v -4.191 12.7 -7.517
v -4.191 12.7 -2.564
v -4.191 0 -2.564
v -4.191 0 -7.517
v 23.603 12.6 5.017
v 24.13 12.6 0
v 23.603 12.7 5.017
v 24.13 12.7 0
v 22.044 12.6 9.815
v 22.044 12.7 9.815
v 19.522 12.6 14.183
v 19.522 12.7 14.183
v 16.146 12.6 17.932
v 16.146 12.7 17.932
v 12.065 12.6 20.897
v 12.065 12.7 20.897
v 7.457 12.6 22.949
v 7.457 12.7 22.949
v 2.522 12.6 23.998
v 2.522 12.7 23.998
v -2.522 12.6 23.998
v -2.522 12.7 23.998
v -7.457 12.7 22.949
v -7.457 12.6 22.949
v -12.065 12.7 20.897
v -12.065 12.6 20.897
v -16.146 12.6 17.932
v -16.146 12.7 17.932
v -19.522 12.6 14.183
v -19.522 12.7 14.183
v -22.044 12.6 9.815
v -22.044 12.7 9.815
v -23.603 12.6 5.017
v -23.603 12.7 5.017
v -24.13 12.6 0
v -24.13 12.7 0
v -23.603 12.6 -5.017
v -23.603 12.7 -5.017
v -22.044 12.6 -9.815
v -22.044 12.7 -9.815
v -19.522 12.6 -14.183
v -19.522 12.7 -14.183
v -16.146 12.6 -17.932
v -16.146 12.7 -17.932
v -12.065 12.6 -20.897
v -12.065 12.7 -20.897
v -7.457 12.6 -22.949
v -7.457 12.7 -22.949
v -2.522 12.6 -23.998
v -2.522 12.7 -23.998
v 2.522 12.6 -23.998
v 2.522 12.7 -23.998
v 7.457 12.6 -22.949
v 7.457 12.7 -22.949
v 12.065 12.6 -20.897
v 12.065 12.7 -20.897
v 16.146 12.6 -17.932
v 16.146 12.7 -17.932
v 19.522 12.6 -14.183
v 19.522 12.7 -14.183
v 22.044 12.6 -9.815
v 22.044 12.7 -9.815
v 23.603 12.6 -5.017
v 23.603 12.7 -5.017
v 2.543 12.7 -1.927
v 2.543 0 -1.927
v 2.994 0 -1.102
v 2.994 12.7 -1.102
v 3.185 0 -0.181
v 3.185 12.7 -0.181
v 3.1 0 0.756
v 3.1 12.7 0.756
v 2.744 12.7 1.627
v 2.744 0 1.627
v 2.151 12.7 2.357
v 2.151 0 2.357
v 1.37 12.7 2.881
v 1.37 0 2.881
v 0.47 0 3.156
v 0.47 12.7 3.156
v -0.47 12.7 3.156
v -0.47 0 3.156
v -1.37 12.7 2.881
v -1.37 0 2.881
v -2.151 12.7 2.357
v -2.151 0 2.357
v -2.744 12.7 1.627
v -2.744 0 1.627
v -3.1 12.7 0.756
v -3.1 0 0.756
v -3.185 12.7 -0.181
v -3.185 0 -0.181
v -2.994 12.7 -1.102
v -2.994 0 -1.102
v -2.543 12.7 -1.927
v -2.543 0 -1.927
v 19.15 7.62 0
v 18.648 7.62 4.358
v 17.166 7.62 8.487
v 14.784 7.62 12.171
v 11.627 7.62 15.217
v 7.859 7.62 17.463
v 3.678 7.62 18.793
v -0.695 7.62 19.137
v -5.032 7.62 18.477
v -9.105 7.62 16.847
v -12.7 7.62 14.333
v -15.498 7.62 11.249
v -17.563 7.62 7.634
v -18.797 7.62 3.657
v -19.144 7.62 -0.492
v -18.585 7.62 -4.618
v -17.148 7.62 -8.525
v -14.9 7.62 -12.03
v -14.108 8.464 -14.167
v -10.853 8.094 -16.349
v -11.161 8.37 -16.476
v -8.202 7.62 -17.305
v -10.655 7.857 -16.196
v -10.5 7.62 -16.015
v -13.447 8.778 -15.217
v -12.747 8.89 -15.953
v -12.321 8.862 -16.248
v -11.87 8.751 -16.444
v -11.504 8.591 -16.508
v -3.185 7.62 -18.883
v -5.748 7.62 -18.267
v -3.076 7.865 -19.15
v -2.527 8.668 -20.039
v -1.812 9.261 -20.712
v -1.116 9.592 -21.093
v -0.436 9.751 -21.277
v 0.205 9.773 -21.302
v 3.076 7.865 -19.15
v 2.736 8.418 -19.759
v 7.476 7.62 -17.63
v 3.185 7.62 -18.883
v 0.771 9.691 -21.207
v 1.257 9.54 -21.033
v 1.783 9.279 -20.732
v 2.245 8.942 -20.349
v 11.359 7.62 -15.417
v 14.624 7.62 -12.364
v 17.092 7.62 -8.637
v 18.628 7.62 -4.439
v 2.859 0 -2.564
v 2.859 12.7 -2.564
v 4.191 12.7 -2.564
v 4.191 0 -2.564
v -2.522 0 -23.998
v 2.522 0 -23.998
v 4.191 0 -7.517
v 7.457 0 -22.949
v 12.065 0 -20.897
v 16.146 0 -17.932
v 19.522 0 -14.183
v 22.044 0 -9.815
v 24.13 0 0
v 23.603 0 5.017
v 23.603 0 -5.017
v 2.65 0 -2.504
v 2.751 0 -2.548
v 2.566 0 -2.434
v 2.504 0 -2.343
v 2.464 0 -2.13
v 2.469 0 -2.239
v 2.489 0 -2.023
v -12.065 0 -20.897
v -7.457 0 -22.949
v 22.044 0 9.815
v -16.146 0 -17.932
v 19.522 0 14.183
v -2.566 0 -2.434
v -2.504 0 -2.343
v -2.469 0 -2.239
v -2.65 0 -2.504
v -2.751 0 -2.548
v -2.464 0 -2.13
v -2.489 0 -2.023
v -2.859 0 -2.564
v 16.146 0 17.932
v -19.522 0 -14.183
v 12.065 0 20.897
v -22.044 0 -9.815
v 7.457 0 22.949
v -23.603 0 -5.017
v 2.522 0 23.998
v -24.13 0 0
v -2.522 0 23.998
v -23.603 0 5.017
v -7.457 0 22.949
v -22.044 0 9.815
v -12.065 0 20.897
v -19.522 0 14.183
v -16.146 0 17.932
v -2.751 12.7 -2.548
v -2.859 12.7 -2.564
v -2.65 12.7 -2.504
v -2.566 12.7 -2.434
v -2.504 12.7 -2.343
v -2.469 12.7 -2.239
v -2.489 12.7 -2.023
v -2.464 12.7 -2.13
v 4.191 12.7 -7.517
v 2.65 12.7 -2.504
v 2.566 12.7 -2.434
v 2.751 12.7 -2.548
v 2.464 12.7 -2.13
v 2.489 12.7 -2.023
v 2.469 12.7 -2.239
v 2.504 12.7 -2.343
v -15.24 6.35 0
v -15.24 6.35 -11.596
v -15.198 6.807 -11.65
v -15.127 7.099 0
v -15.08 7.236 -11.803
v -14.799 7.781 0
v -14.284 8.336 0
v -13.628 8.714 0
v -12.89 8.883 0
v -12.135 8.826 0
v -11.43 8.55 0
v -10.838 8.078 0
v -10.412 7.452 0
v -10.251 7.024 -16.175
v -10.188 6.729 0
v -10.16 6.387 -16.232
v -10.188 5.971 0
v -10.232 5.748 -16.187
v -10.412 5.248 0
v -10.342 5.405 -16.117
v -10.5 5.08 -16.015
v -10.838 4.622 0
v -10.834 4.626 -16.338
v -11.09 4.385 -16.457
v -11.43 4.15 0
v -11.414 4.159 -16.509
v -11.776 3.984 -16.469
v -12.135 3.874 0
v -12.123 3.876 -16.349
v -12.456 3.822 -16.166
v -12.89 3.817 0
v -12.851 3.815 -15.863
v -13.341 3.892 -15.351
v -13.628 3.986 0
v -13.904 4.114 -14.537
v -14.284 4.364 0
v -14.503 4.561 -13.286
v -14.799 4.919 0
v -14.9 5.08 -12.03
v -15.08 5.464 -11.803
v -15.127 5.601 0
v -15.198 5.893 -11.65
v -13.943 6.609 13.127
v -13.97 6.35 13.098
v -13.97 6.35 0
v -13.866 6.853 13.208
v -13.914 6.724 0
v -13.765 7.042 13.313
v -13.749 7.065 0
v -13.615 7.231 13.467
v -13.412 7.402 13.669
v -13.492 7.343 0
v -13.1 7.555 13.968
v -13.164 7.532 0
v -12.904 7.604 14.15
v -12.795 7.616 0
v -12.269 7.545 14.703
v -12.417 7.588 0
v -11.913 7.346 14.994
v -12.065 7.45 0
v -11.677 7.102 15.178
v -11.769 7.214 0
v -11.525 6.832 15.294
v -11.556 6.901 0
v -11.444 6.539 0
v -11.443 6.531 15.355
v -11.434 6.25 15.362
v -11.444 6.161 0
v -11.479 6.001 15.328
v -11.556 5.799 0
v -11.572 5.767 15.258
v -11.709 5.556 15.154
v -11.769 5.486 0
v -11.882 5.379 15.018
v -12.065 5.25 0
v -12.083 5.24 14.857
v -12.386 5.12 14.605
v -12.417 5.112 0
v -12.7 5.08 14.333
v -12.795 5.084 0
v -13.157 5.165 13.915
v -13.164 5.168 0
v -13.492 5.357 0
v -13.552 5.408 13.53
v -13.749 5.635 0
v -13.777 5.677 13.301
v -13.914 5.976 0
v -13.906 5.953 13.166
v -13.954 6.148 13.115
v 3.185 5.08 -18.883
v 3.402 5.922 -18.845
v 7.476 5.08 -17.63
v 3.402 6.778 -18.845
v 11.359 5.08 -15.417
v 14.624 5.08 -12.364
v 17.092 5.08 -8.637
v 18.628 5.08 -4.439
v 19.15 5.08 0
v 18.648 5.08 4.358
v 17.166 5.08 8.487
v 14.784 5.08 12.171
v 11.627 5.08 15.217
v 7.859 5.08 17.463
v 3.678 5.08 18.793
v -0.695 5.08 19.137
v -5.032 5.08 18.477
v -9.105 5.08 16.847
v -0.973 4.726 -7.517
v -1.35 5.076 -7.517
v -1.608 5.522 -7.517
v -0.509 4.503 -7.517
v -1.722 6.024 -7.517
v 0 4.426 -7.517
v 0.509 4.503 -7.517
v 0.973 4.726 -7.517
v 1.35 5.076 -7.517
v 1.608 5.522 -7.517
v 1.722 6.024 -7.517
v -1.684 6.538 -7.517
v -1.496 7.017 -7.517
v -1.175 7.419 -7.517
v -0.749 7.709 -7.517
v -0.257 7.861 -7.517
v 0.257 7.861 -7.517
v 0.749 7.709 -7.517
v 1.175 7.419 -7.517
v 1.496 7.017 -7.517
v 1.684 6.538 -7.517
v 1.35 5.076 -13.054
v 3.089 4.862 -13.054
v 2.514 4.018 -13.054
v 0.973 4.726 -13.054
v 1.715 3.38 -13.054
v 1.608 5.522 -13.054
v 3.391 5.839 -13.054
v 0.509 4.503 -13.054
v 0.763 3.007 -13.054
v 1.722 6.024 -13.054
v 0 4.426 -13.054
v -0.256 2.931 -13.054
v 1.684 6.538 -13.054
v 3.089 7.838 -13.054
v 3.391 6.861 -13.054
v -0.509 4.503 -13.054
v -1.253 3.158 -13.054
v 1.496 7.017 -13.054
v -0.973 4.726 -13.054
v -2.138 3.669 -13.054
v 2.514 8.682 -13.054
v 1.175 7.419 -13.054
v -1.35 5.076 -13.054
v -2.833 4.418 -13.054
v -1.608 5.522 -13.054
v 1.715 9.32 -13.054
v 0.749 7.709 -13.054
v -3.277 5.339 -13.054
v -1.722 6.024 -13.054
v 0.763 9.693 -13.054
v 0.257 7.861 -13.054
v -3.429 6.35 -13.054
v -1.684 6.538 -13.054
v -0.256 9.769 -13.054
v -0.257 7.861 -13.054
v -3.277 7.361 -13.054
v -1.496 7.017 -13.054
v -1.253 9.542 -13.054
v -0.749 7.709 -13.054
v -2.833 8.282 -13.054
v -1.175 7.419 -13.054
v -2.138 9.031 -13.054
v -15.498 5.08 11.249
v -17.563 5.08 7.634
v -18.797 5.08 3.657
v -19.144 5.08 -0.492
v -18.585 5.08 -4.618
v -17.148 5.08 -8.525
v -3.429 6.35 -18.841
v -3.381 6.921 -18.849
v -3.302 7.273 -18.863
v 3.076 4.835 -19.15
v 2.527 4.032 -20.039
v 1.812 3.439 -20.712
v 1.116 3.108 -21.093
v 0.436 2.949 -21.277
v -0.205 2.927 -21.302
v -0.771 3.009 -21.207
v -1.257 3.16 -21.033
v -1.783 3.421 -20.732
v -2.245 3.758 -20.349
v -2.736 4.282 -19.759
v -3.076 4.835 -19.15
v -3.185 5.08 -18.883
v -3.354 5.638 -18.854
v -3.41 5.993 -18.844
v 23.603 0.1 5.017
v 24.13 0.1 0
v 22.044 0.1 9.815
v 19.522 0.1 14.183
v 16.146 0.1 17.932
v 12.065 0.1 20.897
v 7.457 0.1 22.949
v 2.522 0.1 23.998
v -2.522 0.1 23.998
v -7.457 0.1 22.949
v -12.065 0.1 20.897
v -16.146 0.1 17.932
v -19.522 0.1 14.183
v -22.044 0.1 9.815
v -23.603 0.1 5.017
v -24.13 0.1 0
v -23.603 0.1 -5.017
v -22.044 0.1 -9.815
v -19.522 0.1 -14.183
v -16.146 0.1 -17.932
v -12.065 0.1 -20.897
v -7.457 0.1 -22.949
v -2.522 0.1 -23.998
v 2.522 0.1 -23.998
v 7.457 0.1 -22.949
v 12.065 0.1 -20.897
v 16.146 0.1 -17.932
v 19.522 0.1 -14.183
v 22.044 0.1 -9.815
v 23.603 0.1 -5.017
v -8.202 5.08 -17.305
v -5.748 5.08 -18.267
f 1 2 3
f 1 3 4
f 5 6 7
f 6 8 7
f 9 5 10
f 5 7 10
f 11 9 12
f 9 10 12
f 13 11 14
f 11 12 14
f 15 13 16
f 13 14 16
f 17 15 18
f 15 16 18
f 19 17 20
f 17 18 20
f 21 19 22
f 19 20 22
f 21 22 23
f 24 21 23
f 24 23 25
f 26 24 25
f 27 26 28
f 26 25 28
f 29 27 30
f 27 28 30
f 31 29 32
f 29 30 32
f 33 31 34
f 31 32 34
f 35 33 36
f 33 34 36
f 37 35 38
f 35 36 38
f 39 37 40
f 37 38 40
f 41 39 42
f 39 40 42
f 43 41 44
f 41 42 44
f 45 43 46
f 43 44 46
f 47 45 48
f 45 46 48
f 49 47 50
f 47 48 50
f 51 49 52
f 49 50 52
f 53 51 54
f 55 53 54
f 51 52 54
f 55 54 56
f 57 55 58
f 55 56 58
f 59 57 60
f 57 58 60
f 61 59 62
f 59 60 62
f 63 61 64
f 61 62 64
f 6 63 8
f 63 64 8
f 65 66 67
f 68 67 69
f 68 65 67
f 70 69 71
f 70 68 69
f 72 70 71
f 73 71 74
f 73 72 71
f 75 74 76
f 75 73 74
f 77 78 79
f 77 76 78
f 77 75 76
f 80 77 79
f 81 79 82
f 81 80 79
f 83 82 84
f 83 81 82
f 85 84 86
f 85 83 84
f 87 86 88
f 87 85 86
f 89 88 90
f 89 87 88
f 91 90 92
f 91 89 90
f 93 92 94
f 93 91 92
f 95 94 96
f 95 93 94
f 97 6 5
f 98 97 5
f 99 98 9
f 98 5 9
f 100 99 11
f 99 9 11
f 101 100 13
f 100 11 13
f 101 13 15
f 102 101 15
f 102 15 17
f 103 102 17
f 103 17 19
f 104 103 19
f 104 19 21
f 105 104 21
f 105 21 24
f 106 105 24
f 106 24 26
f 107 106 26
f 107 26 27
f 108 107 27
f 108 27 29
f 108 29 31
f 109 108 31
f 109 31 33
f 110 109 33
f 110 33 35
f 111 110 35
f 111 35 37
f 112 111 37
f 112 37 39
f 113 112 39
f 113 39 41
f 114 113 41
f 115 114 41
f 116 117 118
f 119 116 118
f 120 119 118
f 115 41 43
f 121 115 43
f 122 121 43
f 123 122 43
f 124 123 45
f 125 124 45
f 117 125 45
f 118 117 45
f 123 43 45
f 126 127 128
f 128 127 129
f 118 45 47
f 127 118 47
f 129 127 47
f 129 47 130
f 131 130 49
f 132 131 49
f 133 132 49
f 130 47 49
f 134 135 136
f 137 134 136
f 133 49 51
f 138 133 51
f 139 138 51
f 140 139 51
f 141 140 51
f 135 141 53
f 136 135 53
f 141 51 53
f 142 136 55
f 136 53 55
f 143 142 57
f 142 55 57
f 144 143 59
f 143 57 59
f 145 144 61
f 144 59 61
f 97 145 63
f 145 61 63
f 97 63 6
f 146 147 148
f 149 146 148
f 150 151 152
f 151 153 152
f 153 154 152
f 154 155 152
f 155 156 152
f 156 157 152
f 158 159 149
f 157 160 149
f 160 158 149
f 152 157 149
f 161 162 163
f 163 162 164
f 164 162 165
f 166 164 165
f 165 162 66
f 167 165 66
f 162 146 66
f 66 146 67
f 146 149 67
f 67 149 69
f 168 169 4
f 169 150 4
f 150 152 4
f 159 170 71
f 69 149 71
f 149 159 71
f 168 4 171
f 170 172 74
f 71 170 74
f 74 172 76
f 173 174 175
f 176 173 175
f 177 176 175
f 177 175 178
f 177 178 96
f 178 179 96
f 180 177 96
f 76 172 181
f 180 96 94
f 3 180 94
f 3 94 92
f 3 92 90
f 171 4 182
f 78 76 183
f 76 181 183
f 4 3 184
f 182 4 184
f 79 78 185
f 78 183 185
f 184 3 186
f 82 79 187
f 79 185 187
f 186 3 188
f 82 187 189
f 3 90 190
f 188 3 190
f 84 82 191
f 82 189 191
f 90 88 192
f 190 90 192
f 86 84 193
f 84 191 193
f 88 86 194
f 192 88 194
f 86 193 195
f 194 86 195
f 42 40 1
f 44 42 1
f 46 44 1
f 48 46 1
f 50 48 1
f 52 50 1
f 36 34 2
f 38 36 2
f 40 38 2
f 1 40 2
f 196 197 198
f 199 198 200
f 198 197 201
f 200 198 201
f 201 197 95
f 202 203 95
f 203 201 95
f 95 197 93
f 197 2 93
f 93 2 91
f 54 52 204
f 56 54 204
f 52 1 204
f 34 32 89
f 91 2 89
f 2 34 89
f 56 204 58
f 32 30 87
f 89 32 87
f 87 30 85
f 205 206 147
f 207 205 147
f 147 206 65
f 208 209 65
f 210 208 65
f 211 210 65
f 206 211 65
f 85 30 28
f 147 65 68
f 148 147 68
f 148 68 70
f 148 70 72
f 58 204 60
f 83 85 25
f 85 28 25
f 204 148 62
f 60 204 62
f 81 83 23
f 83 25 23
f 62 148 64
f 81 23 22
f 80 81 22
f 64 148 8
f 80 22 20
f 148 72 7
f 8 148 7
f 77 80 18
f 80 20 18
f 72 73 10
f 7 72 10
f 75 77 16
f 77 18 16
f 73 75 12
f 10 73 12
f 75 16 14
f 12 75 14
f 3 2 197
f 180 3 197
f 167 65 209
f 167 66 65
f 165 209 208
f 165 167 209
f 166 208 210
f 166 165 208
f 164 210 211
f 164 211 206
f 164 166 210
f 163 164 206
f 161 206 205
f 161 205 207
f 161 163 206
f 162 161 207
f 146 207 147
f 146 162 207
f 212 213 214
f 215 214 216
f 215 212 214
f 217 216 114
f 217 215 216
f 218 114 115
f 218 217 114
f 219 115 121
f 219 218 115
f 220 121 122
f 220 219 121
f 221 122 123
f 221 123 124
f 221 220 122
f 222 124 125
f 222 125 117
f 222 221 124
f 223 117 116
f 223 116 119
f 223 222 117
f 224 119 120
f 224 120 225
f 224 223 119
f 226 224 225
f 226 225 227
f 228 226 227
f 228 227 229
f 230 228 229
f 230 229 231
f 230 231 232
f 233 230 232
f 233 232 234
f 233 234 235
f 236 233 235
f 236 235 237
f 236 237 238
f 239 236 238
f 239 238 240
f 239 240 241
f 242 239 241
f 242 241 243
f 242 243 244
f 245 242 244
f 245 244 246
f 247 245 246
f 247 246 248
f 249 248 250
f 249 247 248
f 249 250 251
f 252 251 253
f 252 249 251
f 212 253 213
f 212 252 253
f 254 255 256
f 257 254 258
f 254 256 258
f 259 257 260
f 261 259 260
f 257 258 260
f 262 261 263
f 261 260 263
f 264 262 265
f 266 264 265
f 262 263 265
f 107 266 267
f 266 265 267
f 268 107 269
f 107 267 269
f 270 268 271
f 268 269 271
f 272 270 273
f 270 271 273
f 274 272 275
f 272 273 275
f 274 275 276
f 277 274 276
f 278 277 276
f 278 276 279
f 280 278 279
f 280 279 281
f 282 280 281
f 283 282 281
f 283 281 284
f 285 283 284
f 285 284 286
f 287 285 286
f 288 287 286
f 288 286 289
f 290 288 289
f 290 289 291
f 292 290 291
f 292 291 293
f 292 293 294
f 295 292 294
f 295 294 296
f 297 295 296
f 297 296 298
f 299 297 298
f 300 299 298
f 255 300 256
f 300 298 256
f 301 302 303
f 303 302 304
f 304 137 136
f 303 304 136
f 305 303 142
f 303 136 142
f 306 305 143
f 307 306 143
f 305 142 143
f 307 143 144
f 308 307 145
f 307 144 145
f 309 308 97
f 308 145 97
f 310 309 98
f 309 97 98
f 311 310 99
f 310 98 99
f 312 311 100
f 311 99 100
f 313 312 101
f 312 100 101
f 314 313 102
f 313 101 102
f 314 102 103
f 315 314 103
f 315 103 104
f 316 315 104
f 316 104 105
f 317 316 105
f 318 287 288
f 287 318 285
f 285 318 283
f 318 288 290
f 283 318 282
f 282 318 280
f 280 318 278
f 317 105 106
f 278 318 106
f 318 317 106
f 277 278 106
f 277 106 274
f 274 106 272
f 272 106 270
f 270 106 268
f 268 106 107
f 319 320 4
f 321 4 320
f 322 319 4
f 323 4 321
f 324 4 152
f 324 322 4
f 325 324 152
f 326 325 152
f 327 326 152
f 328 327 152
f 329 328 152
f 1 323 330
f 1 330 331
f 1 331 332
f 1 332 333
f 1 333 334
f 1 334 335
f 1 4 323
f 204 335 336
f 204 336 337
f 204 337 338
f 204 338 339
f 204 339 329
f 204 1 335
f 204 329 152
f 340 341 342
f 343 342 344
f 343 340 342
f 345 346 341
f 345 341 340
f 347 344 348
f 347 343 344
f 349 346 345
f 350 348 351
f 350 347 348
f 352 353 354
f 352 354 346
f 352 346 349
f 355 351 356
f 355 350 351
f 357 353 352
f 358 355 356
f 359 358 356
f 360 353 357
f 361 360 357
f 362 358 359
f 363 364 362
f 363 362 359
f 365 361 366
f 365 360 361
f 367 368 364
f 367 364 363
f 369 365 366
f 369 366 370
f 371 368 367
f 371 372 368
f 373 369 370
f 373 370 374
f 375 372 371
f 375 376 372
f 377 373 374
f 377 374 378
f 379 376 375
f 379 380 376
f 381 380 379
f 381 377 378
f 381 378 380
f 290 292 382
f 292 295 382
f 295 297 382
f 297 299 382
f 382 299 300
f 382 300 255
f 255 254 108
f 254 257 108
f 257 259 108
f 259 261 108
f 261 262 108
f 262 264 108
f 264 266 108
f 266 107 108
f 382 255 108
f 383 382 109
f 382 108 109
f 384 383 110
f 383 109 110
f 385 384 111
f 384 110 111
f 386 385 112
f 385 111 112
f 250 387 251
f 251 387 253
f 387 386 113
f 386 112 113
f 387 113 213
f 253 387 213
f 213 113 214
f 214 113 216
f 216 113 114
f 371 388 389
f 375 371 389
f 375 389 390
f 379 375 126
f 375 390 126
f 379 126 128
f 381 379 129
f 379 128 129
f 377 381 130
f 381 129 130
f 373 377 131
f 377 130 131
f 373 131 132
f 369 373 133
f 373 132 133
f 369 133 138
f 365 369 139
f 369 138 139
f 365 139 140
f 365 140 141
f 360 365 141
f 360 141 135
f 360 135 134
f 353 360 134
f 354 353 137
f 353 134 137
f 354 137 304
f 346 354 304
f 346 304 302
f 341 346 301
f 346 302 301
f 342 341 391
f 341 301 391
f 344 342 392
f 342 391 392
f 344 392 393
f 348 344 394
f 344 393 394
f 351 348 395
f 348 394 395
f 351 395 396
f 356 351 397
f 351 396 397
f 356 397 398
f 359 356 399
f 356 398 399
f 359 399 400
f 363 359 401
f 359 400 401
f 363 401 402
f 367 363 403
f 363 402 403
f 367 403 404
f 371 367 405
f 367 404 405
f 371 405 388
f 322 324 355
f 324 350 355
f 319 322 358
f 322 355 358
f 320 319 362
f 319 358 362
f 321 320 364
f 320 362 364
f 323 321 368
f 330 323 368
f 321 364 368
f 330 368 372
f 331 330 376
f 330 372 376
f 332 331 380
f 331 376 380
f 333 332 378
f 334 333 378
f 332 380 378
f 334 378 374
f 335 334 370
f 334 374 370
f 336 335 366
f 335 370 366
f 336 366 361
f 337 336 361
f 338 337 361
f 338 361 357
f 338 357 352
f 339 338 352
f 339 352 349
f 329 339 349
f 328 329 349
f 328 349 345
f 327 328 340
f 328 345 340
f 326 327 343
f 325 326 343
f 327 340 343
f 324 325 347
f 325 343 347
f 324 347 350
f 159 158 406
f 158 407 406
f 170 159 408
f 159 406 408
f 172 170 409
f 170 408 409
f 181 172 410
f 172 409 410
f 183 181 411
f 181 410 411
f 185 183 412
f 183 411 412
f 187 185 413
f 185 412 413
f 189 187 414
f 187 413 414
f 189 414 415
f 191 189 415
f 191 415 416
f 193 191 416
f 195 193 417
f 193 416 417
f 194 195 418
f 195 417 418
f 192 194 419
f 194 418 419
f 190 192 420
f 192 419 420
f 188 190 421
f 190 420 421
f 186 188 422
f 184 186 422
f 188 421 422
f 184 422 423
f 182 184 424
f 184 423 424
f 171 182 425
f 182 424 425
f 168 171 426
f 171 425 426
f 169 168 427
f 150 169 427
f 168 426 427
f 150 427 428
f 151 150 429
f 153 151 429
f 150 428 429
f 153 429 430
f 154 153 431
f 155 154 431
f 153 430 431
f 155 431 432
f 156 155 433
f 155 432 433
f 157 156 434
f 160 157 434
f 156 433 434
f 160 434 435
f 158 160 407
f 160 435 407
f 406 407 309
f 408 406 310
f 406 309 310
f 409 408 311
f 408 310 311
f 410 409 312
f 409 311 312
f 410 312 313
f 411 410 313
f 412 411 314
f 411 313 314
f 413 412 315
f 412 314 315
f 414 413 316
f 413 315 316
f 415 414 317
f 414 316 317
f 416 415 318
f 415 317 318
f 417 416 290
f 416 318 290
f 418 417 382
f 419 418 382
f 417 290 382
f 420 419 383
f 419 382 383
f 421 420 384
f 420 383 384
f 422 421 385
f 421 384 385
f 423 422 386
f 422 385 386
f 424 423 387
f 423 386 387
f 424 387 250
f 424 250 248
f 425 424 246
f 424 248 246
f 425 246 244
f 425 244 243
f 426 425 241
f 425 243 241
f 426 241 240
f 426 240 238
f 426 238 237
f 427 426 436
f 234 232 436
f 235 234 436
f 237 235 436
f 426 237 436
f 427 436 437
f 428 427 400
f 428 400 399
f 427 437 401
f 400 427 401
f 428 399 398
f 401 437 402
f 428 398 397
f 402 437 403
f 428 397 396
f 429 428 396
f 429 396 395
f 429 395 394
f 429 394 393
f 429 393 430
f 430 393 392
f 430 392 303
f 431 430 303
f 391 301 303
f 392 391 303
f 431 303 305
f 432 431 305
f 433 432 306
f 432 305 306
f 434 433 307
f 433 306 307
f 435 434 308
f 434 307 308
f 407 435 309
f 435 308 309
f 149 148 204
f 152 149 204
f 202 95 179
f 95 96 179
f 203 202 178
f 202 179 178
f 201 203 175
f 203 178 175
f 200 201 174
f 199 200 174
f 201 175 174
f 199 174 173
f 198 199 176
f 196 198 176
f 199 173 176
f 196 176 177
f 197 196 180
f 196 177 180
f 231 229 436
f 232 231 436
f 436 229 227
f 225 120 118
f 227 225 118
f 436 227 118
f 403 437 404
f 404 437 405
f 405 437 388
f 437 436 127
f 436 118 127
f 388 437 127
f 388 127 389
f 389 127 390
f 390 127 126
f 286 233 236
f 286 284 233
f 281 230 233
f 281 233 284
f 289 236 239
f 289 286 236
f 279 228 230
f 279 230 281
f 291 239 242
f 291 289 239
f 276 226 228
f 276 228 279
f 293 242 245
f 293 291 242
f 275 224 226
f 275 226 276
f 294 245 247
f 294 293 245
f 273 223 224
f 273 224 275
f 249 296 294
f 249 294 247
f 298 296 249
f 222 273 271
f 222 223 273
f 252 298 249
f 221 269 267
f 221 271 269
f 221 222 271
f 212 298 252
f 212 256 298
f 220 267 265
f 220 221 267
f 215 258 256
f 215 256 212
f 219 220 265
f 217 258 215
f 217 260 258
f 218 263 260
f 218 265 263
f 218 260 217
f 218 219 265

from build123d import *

# Parameters (mm, degrees)
CUT_EXTRUDE2_DEPTH      = 13.7
SKETCH9_W               = 8.382
SKETCH9_H               = 4.953
CUT_EXTRUDE3_DEPTH      = 13.7
FILLET2_R               = 0.396875
SKETCH14_W              = 1.7272
SKETCH14_H              = 21.5665
SKETCH15_R              = 3.429
CUT_EXTRUDE4_DEPTH      = 5.9800001
CUT_EXTRUDE4_DEPTH_BACK = 6.096
CUT_EXTRUDE6_START      = -19.15
SKETCH16_R              = 1.27
CUT_EXTRUDE6_DEPTH      = 25.1300001
CUT_EXTRUDE7_START      = -19.15
SKETCH16_3_R            = 2.54
CUT_EXTRUDE7_DEPTH      = 25.1300001


with BuildPart() as part:
    # Sketch7 → Revolve1 (revolve)
    with BuildSketch(Plane.XY):
        Polygon((0, 0), (24.13, 0), (24.13, 0.1), (19.15, 5.08), (19.15, 7.62), (24.13, 12.6), (24.13, 12.7), (0, 12.7), align=None)
    revolve(axis=Axis((0, 12.7, 0), (0, -1, 0)))

    # Sketch8 → Cut-Extrude2 (cut, through all)
    with BuildSketch(Plane(origin=(0, 12.7, 0), x_dir=(1, 0, 0), z_dir=(0, 1, 0))):
        with BuildLine():
            Line((-1.899409908, 2.5635), (1.899409908, 2.5635))
            ThreePointArc((1.899409908, 2.5635), (0, -3.1905), (-1.899409908, 2.5635))
        make_face()
    extrude(amount=-CUT_EXTRUDE2_DEPTH, mode=Mode.SUBTRACT)

    # Sketch9 → Cut-Extrude3 (cut, through all)
    with BuildSketch(Plane(origin=(0, 12.7, 0), x_dir=(1, 0, 0), z_dir=(0, 1, 0))):
        with Locations((0, 5.04)):
            Rectangle(SKETCH9_W, SKETCH9_H)
    extrude(amount=-CUT_EXTRUDE3_DEPTH, mode=Mode.SUBTRACT)

    # Fillet2
    fillet2_edges = [part.edges().sort_by_distance(p)[0] for p in [
        (1.899409908, 6.35, -2.5635),
        (-1.899409908, 6.35, -2.5635),
    ]]
    fillet(fillet2_edges, radius=FILLET2_R)

    # Sketch14 → #8-32 Tapped Hole1 (revolve, cut)
    with BuildSketch(Plane(origin=(0, 6.153258969, -2.5635), x_dir=(0, -1, 0), z_dir=(1, 0, 0))):
        with Locations((0.8636, 10.78325)):
            Rectangle(SKETCH14_W, SKETCH14_H)
    revolve(axis=Axis((0, 6.153258969, 3.7865), (0, 0, -1)), mode=Mode.SUBTRACT)

    # Sketch15 → Cut-Extrude4 (cut, two sides)
    with BuildSketch(Plane(origin=(0, 0, -19.15), x_dir=(-1, 0, 0), z_dir=(0, 0, -1))) as cut_extrude4_sk:
        with Locations((0, 6.35)):
            Circle(SKETCH15_R)
    extrude(amount=CUT_EXTRUDE4_DEPTH, mode=Mode.SUBTRACT)
    extrude(cut_extrude4_sk.sketch, amount=-CUT_EXTRUDE4_DEPTH_BACK, mode=Mode.SUBTRACT)

    # Sketch16 → Cut-Extrude6 (cut, through all)
    with BuildSketch(Plane(origin=(0, 0, -19.15), x_dir=(-1, 0, 0), z_dir=(0, 0, -1)).offset(CUT_EXTRUDE6_START)):
        with Locations((12.7, 6.35)):
            Circle(SKETCH16_R)
    extrude(amount=-CUT_EXTRUDE6_DEPTH, mode=Mode.SUBTRACT)

    # Sketch16<3> → Cut-Extrude7 (cut, through all)
    with BuildSketch(Plane(origin=(0, 0, -19.15), x_dir=(-1, 0, 0), z_dir=(0, 0, -1)).offset(CUT_EXTRUDE7_START)):
        with Locations((12.7, 6.35)):
            Circle(SKETCH16_3_R)
    extrude(amount=CUT_EXTRUDE7_DEPTH, mode=Mode.SUBTRACT)


solid = part.part
